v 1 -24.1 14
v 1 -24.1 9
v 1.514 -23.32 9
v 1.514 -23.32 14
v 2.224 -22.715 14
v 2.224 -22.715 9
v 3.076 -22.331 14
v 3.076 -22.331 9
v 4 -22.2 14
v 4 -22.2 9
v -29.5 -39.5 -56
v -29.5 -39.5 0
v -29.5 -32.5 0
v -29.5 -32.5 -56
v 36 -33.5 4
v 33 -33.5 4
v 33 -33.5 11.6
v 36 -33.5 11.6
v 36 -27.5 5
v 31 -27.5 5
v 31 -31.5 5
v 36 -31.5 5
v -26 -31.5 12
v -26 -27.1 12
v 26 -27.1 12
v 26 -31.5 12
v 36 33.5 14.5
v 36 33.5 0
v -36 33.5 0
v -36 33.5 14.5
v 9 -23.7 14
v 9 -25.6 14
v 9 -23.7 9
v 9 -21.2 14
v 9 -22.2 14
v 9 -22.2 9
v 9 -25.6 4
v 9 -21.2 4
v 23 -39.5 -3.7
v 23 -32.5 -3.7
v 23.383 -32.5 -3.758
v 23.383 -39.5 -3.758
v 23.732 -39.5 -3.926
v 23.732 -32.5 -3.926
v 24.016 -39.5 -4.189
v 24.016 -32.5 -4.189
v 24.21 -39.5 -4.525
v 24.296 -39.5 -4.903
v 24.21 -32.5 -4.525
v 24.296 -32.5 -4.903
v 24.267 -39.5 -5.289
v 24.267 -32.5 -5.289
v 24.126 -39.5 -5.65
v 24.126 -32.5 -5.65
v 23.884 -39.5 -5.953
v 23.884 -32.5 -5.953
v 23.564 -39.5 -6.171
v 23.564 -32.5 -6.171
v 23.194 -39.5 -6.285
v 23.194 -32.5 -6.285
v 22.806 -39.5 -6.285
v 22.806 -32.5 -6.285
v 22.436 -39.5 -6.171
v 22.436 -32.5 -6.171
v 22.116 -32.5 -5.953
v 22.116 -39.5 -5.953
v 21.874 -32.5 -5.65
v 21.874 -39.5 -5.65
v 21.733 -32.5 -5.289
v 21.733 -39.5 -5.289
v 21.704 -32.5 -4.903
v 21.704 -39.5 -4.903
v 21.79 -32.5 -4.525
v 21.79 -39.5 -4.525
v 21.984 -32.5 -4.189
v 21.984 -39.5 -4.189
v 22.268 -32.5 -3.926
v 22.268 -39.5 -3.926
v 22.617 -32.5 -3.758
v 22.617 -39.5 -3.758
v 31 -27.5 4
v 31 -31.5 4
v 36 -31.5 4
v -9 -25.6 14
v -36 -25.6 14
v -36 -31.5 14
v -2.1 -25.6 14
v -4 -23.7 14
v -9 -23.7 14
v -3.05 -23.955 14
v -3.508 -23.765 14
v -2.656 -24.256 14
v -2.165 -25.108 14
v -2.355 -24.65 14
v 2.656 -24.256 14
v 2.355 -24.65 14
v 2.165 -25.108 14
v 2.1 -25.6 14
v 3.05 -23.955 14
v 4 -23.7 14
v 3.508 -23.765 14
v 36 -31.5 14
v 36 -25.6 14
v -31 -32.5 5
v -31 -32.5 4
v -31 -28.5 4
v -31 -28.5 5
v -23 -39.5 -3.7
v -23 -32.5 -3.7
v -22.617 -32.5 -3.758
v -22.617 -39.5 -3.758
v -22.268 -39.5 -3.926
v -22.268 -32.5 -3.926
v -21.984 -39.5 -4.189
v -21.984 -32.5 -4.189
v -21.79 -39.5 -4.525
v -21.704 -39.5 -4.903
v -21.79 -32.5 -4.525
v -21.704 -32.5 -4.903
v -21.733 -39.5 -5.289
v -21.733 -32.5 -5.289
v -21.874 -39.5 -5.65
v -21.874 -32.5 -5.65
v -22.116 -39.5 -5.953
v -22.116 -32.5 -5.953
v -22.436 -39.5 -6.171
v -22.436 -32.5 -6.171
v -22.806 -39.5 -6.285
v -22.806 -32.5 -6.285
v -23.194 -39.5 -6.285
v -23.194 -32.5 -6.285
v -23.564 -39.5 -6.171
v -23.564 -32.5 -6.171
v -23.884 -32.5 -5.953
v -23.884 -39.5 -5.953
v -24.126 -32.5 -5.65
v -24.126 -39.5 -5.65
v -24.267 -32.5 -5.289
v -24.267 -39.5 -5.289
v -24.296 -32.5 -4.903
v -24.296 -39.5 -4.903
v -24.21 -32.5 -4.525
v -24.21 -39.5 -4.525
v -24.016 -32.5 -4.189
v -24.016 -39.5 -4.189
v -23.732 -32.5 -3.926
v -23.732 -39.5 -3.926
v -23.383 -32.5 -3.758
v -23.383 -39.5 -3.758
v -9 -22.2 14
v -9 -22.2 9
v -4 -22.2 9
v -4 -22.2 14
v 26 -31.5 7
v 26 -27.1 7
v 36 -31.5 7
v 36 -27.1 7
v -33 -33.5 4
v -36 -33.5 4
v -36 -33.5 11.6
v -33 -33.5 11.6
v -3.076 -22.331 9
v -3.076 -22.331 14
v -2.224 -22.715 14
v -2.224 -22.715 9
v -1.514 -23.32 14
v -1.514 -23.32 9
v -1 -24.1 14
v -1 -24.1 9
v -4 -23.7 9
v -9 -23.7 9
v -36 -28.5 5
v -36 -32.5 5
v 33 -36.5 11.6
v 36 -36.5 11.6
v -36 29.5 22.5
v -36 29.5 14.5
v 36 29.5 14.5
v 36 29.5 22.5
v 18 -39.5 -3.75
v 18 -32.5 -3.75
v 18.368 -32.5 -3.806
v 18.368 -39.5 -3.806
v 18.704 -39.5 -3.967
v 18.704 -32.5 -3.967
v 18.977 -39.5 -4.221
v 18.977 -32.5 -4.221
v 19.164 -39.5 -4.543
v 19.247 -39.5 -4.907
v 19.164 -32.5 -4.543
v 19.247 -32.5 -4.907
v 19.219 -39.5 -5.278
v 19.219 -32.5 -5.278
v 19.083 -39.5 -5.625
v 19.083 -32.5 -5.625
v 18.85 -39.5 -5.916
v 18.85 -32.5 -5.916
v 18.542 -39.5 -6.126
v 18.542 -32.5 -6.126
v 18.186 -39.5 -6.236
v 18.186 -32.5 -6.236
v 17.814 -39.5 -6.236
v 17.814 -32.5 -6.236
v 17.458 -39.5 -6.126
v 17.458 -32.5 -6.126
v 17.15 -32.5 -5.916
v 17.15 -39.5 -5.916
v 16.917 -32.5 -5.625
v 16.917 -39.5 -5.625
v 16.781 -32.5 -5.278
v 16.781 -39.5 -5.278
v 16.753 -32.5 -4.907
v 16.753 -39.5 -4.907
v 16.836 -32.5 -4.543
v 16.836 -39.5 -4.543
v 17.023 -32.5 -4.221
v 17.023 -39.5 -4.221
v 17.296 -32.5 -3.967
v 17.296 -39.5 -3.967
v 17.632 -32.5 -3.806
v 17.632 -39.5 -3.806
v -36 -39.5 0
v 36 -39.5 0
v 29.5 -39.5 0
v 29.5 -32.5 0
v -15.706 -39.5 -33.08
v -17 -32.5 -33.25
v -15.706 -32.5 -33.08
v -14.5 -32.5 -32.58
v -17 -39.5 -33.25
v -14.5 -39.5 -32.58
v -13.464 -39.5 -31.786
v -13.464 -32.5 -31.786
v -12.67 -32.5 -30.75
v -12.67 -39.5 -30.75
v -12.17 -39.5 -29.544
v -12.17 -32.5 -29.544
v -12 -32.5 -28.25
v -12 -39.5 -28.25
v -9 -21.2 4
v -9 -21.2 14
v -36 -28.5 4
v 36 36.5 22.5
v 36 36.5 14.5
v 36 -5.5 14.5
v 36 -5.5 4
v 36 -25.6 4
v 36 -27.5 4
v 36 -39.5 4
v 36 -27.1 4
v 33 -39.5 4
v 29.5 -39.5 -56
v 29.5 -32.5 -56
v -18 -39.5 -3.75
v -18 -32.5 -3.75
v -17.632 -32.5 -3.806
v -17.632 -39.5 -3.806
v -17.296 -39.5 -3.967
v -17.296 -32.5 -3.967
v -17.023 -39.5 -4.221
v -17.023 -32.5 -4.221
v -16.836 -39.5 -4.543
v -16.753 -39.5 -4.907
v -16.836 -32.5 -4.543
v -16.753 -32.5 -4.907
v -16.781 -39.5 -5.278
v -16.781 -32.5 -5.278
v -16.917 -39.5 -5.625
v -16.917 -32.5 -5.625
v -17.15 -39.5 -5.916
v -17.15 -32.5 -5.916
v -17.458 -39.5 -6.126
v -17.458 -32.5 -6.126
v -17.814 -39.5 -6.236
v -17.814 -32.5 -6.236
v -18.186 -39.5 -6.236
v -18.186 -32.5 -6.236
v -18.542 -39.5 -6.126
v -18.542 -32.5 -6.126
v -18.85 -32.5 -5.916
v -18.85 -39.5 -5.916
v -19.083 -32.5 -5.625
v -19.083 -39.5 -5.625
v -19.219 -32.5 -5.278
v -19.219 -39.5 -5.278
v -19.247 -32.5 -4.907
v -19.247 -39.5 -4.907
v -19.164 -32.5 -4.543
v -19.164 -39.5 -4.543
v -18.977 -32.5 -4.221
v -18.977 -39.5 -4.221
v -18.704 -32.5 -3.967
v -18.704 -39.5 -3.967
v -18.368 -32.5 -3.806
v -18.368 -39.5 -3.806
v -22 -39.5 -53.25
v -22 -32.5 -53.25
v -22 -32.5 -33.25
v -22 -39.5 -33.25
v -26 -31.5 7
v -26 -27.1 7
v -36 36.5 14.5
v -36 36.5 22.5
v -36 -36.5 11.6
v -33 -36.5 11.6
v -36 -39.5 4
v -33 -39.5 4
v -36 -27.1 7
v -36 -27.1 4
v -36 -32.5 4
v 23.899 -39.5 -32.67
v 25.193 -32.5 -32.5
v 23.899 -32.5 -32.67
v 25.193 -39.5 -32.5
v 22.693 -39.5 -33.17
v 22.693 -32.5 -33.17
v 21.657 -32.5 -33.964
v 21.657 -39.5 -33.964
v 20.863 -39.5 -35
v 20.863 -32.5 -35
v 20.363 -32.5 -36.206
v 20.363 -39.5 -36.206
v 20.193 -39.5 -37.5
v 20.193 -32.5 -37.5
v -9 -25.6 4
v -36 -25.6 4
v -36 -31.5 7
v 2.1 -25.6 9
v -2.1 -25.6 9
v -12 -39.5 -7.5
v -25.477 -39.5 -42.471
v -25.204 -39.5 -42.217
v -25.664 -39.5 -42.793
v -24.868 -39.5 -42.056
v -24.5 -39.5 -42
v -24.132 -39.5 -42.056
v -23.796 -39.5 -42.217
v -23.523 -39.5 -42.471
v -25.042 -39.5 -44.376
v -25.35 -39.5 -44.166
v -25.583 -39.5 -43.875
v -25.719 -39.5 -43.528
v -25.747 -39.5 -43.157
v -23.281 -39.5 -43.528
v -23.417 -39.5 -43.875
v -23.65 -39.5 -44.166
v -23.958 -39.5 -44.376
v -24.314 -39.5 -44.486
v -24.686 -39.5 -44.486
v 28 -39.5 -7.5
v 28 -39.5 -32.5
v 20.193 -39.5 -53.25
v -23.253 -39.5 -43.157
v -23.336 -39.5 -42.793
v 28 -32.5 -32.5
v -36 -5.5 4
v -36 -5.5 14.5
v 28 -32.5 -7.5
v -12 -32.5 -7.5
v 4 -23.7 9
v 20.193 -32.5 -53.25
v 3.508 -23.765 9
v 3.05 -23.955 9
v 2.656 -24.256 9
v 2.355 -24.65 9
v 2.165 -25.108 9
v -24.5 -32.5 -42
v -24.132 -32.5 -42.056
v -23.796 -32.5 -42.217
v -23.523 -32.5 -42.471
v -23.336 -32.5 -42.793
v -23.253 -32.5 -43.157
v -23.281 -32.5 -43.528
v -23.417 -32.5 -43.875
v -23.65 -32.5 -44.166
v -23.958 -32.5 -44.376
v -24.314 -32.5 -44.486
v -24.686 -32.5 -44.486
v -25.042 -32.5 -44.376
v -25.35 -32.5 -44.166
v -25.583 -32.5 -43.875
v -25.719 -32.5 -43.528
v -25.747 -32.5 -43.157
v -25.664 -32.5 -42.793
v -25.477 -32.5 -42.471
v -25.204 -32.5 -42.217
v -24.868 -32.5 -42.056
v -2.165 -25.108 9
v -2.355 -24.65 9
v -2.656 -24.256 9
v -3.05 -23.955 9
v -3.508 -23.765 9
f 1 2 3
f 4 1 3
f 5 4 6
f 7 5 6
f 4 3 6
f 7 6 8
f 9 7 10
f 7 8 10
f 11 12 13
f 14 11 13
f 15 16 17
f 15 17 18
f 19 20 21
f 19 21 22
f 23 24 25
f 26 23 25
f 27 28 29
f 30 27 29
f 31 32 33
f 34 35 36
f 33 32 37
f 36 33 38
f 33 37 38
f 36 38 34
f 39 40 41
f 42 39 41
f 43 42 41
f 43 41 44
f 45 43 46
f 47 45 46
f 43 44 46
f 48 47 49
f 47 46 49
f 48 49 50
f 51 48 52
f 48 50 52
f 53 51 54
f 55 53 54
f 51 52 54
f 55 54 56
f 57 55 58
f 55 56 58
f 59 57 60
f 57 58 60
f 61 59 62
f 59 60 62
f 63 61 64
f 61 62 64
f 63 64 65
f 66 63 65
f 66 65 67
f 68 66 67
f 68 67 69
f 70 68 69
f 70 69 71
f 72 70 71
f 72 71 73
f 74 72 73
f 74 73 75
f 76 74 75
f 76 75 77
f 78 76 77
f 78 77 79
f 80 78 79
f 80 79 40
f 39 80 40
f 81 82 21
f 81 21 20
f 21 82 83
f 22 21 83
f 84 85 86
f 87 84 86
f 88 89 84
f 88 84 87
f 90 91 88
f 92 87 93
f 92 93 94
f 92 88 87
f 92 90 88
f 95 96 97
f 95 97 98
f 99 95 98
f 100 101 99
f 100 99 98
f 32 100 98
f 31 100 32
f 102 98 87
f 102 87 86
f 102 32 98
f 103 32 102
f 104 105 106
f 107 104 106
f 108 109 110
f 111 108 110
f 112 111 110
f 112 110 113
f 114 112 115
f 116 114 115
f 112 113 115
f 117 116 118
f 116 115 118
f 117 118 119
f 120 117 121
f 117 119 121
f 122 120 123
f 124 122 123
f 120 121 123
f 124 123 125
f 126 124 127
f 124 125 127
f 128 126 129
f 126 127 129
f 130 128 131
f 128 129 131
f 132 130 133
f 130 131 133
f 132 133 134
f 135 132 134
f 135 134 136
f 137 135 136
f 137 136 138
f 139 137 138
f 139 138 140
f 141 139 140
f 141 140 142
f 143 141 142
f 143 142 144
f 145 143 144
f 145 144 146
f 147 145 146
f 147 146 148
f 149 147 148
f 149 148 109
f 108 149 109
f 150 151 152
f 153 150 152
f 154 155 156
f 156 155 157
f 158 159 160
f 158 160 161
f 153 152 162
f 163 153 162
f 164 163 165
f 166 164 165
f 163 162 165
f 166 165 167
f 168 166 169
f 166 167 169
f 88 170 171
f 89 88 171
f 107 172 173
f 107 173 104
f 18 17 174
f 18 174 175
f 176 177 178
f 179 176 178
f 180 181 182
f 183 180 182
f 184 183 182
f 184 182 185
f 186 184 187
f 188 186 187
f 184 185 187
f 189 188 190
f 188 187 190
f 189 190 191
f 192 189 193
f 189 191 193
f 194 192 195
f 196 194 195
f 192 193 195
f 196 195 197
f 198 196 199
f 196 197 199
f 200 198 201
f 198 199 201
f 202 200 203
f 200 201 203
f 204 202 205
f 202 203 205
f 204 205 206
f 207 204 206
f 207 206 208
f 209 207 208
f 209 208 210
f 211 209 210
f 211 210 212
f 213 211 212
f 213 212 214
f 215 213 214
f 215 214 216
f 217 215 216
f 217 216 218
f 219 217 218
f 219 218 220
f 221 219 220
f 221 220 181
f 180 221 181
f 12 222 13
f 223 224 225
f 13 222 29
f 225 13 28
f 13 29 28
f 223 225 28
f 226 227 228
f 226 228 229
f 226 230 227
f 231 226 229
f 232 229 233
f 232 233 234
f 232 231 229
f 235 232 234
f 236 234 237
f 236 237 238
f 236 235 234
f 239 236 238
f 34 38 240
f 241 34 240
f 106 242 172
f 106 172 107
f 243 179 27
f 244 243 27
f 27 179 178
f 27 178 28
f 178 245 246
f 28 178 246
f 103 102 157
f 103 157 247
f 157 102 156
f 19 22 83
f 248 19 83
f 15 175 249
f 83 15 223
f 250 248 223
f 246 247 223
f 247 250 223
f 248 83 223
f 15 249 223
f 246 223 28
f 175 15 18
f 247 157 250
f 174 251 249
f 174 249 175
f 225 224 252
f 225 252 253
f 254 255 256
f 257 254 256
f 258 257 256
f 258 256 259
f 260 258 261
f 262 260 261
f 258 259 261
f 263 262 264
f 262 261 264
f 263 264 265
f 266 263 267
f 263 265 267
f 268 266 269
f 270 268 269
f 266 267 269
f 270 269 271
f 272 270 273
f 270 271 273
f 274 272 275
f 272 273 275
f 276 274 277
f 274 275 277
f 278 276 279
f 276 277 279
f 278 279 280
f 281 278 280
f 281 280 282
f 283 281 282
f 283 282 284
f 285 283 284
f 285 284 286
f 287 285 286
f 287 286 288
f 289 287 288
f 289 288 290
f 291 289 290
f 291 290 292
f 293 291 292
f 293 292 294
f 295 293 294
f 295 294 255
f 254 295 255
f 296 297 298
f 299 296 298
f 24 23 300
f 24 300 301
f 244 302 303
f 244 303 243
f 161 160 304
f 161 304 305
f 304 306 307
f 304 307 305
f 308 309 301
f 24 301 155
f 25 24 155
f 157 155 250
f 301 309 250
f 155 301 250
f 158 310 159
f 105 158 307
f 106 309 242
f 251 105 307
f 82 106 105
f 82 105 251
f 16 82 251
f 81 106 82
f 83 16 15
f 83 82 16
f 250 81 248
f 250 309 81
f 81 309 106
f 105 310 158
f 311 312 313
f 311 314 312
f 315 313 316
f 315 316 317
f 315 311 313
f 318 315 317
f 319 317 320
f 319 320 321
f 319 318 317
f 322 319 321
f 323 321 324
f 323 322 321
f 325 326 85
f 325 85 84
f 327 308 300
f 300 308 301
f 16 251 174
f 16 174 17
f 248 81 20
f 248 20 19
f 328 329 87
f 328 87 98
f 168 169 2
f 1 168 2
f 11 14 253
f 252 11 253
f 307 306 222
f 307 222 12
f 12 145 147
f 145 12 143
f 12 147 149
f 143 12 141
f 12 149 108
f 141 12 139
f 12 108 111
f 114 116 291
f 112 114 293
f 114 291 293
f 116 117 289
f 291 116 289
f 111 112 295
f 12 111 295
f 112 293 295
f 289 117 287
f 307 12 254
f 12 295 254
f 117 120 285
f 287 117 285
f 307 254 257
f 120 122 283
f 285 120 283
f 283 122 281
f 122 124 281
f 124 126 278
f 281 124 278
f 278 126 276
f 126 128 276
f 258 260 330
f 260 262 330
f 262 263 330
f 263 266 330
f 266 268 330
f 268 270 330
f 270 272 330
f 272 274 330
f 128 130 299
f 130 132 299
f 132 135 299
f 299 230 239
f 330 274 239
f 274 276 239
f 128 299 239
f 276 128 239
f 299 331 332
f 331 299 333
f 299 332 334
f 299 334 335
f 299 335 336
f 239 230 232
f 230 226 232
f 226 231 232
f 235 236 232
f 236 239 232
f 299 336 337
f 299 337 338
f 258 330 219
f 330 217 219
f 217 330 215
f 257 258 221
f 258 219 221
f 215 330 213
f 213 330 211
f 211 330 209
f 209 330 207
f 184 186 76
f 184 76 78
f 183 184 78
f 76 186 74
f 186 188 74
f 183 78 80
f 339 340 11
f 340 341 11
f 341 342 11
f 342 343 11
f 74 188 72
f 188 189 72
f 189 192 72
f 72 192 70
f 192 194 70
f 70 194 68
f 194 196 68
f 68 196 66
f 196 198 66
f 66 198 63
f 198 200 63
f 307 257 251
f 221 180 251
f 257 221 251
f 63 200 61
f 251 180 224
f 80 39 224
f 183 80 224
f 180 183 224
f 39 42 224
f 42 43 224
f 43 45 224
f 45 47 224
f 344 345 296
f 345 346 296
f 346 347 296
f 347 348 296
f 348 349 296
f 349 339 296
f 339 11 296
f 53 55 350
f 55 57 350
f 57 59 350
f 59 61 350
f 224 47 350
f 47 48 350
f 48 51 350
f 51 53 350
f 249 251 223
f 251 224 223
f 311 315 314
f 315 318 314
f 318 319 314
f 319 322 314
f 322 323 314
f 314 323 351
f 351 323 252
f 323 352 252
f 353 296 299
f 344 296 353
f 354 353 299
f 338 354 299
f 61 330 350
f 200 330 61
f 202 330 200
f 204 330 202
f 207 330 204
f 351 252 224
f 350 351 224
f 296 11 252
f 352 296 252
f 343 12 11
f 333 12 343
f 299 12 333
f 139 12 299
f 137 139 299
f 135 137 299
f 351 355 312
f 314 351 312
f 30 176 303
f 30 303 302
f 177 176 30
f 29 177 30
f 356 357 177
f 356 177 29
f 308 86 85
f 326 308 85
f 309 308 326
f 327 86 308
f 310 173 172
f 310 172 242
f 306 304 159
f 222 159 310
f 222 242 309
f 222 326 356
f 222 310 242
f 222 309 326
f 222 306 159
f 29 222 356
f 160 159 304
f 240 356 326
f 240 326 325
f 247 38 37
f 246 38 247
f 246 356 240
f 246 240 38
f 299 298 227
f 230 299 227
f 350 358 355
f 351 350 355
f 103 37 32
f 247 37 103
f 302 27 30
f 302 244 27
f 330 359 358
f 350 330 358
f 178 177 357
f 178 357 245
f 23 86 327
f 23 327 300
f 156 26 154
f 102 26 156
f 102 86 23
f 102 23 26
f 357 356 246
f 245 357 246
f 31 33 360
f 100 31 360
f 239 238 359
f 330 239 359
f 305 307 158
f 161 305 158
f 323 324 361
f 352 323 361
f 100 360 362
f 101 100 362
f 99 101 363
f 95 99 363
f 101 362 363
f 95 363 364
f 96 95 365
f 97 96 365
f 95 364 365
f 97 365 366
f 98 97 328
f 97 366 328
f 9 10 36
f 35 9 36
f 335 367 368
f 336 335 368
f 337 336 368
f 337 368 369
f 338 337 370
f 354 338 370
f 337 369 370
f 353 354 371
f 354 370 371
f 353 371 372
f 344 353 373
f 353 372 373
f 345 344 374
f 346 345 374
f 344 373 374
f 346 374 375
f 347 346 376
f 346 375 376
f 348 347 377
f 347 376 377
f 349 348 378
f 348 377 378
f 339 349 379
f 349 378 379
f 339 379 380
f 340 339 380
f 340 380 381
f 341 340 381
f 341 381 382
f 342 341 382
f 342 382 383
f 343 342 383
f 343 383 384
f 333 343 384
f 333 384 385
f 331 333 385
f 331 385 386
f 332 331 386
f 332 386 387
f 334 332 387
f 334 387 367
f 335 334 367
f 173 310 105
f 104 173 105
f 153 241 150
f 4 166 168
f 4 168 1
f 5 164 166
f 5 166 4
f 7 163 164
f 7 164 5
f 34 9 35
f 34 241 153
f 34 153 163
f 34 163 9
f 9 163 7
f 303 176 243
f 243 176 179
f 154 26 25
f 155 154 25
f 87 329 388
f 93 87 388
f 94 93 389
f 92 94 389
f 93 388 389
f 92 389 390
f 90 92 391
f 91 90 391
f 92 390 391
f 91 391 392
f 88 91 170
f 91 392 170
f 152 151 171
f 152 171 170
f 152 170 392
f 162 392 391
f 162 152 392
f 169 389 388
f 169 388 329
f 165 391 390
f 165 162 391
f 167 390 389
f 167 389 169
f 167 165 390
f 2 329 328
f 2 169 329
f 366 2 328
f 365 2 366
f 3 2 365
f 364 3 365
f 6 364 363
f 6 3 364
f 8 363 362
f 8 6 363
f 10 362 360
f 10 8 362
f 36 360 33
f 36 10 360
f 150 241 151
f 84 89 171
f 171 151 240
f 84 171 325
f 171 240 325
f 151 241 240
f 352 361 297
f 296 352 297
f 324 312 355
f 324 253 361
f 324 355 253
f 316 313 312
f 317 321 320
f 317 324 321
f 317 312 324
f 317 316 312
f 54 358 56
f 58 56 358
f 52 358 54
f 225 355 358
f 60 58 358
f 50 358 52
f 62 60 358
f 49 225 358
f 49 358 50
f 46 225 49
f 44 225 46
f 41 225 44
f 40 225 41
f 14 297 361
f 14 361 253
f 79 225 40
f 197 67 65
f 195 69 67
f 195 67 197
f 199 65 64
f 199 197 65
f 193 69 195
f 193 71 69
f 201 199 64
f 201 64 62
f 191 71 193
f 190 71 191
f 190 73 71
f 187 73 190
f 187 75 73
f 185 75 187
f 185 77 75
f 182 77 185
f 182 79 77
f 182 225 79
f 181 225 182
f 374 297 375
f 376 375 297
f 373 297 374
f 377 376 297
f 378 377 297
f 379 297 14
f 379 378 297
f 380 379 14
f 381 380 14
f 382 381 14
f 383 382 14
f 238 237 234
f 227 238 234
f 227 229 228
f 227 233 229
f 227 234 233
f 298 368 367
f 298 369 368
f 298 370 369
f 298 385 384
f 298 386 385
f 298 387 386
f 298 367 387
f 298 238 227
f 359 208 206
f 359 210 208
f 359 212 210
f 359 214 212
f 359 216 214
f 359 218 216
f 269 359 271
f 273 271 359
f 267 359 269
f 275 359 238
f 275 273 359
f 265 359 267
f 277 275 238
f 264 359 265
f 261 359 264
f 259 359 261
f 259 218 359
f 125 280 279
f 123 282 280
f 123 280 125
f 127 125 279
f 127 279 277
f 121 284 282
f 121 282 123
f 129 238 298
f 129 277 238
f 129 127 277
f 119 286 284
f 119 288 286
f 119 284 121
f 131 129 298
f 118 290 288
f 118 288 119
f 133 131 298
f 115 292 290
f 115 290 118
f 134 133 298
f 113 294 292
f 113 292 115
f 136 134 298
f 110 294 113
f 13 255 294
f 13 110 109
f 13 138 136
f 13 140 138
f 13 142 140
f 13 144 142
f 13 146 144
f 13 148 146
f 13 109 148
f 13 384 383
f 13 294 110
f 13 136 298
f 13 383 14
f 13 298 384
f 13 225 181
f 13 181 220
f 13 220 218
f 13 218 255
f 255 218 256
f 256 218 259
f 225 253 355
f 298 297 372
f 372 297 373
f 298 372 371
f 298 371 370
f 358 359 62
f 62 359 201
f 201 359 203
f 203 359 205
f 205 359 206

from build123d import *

# Parameters (mm, degrees)
CROQUIS1_W               = 72
CROQUIS1_H               = 74
SALIENTE_EXTRUIR3_DEPTH  = 4
CROQUIS2_W               = 3
CROQUIS2_H               = 6
SALIENTE_EXTRUIR4_DEPTH  = 7.6
CORTAR_EXTRUIR3_DEPTH    = 83.938591741
CROQUIS5_W               = 5
CROQUIS5_H               = 4
SALIENTE_EXTRUIR5_DEPTH  = 1
CROQUIS9_W               = 72
CROQUIS9_H               = 1.5
SALIENTE_EXTRUIR6_DEPTH  = 8
CROQUIS10_W              = 72
CROQUIS10_H              = 5.9
SALIENTE_EXTRUIR7_DEPTH  = 2
CROQUIS11_W              = 10
CROQUIS11_H              = 4.4
SALIENTE_EXTRUIR10_DEPTH = 7
SALIENTE_EXTRUIR14_DEPTH = 10
CROQUIS15_W              = 18
CROQUIS15_H              = 4.4
SALIENTE_EXTRUIR15_DEPTH = 5
CROQUIS16_W              = 72
CROQUIS16_H              = 40
SALIENTE_EXTRUIR16_DEPTH = 10.5
CROQUIS17_W              = 72
CROQUIS17_H              = 5
SALIENTE_EXTRUIR17_DEPTH = 8
CROQUIS18_W              = 72
CROQUIS18_H              = 8
SALIENTE_EXTRUIR19_DEPTH = 2
CROQUIS19_W              = 72
CROQUIS19_H              = 1
CORTAR_EXTRUIR4_DEPTH    = 14.5
CROQUIS20_W              = 59
CROQUIS20_H              = 7
SALIENTE_EXTRUIR20_DEPTH = 65
CROQUIS26_R              = 1.25
CROQUIS26_R_2            = 1.3
CORTAR_EXTRUIR5_DEPTH    = 10
REDONDEO1_R              = 5
CORTAR_EXTRUIR6_REACH    = 103.4
CROQUIS27_W              = 59
CROQUIS27_H              = 9


with BuildPart() as part:
    # Croquis1 → Saliente-Extruir3 (new body)
    with BuildSketch(Plane.XY):
        with Locations((0, -2.5)):
            Rectangle(CROQUIS1_W, CROQUIS1_H)
    extrude(amount=SALIENTE_EXTRUIR3_DEPTH)

    # Croquis2 → Saliente-Extruir4 (add)
    with BuildSketch(Plane.XY.offset(4)):
        with Locations((-34.5, -36.5)):
            Rectangle(CROQUIS2_W, CROQUIS2_H)
        with Locations((34.5, -36.5)):
            Rectangle(CROQUIS2_W, CROQUIS2_H)
    extrude(amount=SALIENTE_EXTRUIR4_DEPTH)

    # Croquis3 → Cortar-Extruir3 (cut, through all)
    with BuildSketch(Plane.ZY.offset(36)):
        Polygon((4, -39.5), (11.6, -36.5), (11.6, -39.5), align=None)
    extrude(amount=-CORTAR_EXTRUIR3_DEPTH, mode=Mode.SUBTRACT)

    # Croquis5 → Saliente-Extruir5 (add)
    with BuildSketch(Plane.XY.offset(4)):
        with Locations((-33.5, -30.5)):
            Rectangle(CROQUIS5_W, CROQUIS5_H)
        with Locations((33.5, -29.5)):
            Rectangle(CROQUIS5_W, CROQUIS5_H)
    extrude(amount=SALIENTE_EXTRUIR5_DEPTH)

    # Croquis9 → Saliente-Extruir6 (add)
    with BuildSketch(Plane.XY.offset(4)):
        with Locations((0, -26.35)):
            Rectangle(CROQUIS9_W, CROQUIS9_H)
    extrude(amount=SALIENTE_EXTRUIR6_DEPTH)

    # Croquis10 → Saliente-Extruir7 (add)
    with BuildSketch(Plane.XY.offset(12)):
        with Locations((0, -28.55)):
            Rectangle(CROQUIS10_W, CROQUIS10_H)
    extrude(amount=SALIENTE_EXTRUIR7_DEPTH)

    # Croquis11 → Saliente-Extruir10 (add)
    with BuildSketch(Plane.XY.offset(14)):
        with Locations((-31, -29.3)):
            Rectangle(CROQUIS11_W, CROQUIS11_H)
        with Locations((31, -29.3)):
            Rectangle(CROQUIS11_W, CROQUIS11_H)
    extrude(amount=-SALIENTE_EXTRUIR10_DEPTH)

    # Croquis14 → Saliente-Extruir14 (add)
    with BuildSketch(Plane.XY.offset(4)):
        with BuildLine():
            Line((-9, -23.7), (-9, -25.6))
            Line((-9, -25.6), (-2.1, -25.6))
            ThreePointArc((-2.1, -25.6), (-2.656497116, -24.256497116), (-4, -23.7))
            Line((-4, -23.7), (-9, -23.7))
        make_face()
        with BuildLine():
            Line((-9, -21.2), (-9, -22.2))
            Line((-9, -22.2), (-4, -22.2))
            ThreePointArc((-4, -22.2), (-2.22447191, -22.714955647), (-1, -24.1))
            Line((-1, -24.1), (1, -24.1))
            ThreePointArc((1, -24.1), (2.22447191, -22.714955647), (4, -22.2))
            Line((4, -22.2), (9, -22.2))
            Line((9, -22.2), (9, -21.2))
            Line((9, -21.2), (-9, -21.2))
        make_face()
        with BuildLine():
            ThreePointArc((4, -23.7), (2.656497116, -24.256497116), (2.1, -25.6))
            Line((2.1, -25.6), (9, -25.6))
            Line((9, -25.6), (9, -23.7))
            Line((9, -23.7), (4, -23.7))
        make_face()
    extrude(amount=SALIENTE_EXTRUIR14_DEPTH)

    # Croquis15 → Saliente-Extruir15 (add)
    with BuildSketch(Plane.XY.offset(4)):
        with Locations((0, -23.4)):
            Rectangle(CROQUIS15_W, CROQUIS15_H)
    extrude(amount=SALIENTE_EXTRUIR15_DEPTH)

    # Croquis16 → Saliente-Extruir16 (add)
    with BuildSketch(Plane.XY.offset(4)):
        with Locations((0, 14.5)):
            Rectangle(CROQUIS16_W, CROQUIS16_H)
    extrude(amount=SALIENTE_EXTRUIR16_DEPTH)

    # Croquis17 → Saliente-Extruir17 (add)
    with BuildSketch(Plane.XY.offset(14.5)):
        with Locations((0, 32)):
            Rectangle(CROQUIS17_W, CROQUIS17_H)
    extrude(amount=SALIENTE_EXTRUIR17_DEPTH)

    # Croquis18 → Saliente-Extruir19 (add)
    with BuildSketch(Plane(origin=(0, 34.5, 0), x_dir=(1, 0, 0), z_dir=(0, 1, 0))):
        with Locations((0, -18.5)):
            Rectangle(CROQUIS18_W, CROQUIS18_H)
    extrude(amount=SALIENTE_EXTRUIR19_DEPTH)

    # Croquis19 → Cortar-Extruir4 (cut)
    with BuildSketch(Plane(origin=(0, 0, 0), x_dir=(-1, 0, 0), z_dir=(0, 0, -1))):
        with Locations((0, 34)):
            Rectangle(CROQUIS19_W, CROQUIS19_H)
    extrude(amount=-CORTAR_EXTRUIR4_DEPTH, mode=Mode.SUBTRACT)

    # Croquis20 → Saliente-Extruir20 (add)
    with BuildSketch(Plane(origin=(0, 0, 0), x_dir=(-1, 0, 0), z_dir=(0, 0, -1))):
        with Locations((0, -36)):
            Rectangle(CROQUIS20_W, CROQUIS20_H)
    extrude(amount=SALIENTE_EXTRUIR20_DEPTH)

    # Croquis26 → Cortar-Extruir5 (cut)
    with BuildSketch(Plane(origin=(0, -32.5, 0), x_dir=(1, 0, 0), z_dir=(0, 1, 0))):
        with Locations(Location((-18, 5, 0), (0, 0, 270))):
            Circle(CROQUIS26_R)
        with Locations(Location((18, 5, 0), (0, 0, 270))):
            Circle(CROQUIS26_R)
        Polygon((20.192818919, 53.25), (-22, 53.25), (-22, 33.25), (-12, 33.25), (-12, 7.5), (28, 7.5), (28, 32.5), (20.192818919, 32.5), align=None)
        with Locations(Location((23, 5, 0), (0, 0, 270))):
            Circle(CROQUIS26_R_2)
        with Locations(Location((-23, 5, 0), (0, 0, 270))):
            Circle(CROQUIS26_R_2)
        with Locations(Location((-24.5, 43.25, 0), (0, 0, 270))):
            Circle(CROQUIS26_R)
    extrude(amount=-CORTAR_EXTRUIR5_DEPTH, mode=Mode.SUBTRACT)

    # Redondeo1
    redondeo1_edges = [part.edges().sort_by_distance(p)[0] for p in [
        (20.192818919, -36, -32.5),
        (-12, -36, -33.25),
    ]]
    fillet(redondeo1_edges, radius=REDONDEO1_R)

    # Croquis27 → Cortar-Extruir6 (cut, up to next)
    with BuildSketch(Plane(origin=(0, -32.5, 0), x_dir=(1, 0, 0), z_dir=(0, 1, 0)), mode=Mode.PRIVATE) as cortar_extruir6_sk1:
        with Locations((0, 60.5)):
            Rectangle(CROQUIS27_W, CROQUIS27_H)
    cortar_extruir6_tool1 = extrude(cortar_extruir6_sk1.sketch, amount=-CORTAR_EXTRUIR6_REACH, mode=Mode.PRIVATE) & part.part
    add(cortar_extruir6_tool1.solids().sort_by_distance((0, -32.5, -60.5))[0], mode=Mode.SUBTRACT)


solid = part.part
